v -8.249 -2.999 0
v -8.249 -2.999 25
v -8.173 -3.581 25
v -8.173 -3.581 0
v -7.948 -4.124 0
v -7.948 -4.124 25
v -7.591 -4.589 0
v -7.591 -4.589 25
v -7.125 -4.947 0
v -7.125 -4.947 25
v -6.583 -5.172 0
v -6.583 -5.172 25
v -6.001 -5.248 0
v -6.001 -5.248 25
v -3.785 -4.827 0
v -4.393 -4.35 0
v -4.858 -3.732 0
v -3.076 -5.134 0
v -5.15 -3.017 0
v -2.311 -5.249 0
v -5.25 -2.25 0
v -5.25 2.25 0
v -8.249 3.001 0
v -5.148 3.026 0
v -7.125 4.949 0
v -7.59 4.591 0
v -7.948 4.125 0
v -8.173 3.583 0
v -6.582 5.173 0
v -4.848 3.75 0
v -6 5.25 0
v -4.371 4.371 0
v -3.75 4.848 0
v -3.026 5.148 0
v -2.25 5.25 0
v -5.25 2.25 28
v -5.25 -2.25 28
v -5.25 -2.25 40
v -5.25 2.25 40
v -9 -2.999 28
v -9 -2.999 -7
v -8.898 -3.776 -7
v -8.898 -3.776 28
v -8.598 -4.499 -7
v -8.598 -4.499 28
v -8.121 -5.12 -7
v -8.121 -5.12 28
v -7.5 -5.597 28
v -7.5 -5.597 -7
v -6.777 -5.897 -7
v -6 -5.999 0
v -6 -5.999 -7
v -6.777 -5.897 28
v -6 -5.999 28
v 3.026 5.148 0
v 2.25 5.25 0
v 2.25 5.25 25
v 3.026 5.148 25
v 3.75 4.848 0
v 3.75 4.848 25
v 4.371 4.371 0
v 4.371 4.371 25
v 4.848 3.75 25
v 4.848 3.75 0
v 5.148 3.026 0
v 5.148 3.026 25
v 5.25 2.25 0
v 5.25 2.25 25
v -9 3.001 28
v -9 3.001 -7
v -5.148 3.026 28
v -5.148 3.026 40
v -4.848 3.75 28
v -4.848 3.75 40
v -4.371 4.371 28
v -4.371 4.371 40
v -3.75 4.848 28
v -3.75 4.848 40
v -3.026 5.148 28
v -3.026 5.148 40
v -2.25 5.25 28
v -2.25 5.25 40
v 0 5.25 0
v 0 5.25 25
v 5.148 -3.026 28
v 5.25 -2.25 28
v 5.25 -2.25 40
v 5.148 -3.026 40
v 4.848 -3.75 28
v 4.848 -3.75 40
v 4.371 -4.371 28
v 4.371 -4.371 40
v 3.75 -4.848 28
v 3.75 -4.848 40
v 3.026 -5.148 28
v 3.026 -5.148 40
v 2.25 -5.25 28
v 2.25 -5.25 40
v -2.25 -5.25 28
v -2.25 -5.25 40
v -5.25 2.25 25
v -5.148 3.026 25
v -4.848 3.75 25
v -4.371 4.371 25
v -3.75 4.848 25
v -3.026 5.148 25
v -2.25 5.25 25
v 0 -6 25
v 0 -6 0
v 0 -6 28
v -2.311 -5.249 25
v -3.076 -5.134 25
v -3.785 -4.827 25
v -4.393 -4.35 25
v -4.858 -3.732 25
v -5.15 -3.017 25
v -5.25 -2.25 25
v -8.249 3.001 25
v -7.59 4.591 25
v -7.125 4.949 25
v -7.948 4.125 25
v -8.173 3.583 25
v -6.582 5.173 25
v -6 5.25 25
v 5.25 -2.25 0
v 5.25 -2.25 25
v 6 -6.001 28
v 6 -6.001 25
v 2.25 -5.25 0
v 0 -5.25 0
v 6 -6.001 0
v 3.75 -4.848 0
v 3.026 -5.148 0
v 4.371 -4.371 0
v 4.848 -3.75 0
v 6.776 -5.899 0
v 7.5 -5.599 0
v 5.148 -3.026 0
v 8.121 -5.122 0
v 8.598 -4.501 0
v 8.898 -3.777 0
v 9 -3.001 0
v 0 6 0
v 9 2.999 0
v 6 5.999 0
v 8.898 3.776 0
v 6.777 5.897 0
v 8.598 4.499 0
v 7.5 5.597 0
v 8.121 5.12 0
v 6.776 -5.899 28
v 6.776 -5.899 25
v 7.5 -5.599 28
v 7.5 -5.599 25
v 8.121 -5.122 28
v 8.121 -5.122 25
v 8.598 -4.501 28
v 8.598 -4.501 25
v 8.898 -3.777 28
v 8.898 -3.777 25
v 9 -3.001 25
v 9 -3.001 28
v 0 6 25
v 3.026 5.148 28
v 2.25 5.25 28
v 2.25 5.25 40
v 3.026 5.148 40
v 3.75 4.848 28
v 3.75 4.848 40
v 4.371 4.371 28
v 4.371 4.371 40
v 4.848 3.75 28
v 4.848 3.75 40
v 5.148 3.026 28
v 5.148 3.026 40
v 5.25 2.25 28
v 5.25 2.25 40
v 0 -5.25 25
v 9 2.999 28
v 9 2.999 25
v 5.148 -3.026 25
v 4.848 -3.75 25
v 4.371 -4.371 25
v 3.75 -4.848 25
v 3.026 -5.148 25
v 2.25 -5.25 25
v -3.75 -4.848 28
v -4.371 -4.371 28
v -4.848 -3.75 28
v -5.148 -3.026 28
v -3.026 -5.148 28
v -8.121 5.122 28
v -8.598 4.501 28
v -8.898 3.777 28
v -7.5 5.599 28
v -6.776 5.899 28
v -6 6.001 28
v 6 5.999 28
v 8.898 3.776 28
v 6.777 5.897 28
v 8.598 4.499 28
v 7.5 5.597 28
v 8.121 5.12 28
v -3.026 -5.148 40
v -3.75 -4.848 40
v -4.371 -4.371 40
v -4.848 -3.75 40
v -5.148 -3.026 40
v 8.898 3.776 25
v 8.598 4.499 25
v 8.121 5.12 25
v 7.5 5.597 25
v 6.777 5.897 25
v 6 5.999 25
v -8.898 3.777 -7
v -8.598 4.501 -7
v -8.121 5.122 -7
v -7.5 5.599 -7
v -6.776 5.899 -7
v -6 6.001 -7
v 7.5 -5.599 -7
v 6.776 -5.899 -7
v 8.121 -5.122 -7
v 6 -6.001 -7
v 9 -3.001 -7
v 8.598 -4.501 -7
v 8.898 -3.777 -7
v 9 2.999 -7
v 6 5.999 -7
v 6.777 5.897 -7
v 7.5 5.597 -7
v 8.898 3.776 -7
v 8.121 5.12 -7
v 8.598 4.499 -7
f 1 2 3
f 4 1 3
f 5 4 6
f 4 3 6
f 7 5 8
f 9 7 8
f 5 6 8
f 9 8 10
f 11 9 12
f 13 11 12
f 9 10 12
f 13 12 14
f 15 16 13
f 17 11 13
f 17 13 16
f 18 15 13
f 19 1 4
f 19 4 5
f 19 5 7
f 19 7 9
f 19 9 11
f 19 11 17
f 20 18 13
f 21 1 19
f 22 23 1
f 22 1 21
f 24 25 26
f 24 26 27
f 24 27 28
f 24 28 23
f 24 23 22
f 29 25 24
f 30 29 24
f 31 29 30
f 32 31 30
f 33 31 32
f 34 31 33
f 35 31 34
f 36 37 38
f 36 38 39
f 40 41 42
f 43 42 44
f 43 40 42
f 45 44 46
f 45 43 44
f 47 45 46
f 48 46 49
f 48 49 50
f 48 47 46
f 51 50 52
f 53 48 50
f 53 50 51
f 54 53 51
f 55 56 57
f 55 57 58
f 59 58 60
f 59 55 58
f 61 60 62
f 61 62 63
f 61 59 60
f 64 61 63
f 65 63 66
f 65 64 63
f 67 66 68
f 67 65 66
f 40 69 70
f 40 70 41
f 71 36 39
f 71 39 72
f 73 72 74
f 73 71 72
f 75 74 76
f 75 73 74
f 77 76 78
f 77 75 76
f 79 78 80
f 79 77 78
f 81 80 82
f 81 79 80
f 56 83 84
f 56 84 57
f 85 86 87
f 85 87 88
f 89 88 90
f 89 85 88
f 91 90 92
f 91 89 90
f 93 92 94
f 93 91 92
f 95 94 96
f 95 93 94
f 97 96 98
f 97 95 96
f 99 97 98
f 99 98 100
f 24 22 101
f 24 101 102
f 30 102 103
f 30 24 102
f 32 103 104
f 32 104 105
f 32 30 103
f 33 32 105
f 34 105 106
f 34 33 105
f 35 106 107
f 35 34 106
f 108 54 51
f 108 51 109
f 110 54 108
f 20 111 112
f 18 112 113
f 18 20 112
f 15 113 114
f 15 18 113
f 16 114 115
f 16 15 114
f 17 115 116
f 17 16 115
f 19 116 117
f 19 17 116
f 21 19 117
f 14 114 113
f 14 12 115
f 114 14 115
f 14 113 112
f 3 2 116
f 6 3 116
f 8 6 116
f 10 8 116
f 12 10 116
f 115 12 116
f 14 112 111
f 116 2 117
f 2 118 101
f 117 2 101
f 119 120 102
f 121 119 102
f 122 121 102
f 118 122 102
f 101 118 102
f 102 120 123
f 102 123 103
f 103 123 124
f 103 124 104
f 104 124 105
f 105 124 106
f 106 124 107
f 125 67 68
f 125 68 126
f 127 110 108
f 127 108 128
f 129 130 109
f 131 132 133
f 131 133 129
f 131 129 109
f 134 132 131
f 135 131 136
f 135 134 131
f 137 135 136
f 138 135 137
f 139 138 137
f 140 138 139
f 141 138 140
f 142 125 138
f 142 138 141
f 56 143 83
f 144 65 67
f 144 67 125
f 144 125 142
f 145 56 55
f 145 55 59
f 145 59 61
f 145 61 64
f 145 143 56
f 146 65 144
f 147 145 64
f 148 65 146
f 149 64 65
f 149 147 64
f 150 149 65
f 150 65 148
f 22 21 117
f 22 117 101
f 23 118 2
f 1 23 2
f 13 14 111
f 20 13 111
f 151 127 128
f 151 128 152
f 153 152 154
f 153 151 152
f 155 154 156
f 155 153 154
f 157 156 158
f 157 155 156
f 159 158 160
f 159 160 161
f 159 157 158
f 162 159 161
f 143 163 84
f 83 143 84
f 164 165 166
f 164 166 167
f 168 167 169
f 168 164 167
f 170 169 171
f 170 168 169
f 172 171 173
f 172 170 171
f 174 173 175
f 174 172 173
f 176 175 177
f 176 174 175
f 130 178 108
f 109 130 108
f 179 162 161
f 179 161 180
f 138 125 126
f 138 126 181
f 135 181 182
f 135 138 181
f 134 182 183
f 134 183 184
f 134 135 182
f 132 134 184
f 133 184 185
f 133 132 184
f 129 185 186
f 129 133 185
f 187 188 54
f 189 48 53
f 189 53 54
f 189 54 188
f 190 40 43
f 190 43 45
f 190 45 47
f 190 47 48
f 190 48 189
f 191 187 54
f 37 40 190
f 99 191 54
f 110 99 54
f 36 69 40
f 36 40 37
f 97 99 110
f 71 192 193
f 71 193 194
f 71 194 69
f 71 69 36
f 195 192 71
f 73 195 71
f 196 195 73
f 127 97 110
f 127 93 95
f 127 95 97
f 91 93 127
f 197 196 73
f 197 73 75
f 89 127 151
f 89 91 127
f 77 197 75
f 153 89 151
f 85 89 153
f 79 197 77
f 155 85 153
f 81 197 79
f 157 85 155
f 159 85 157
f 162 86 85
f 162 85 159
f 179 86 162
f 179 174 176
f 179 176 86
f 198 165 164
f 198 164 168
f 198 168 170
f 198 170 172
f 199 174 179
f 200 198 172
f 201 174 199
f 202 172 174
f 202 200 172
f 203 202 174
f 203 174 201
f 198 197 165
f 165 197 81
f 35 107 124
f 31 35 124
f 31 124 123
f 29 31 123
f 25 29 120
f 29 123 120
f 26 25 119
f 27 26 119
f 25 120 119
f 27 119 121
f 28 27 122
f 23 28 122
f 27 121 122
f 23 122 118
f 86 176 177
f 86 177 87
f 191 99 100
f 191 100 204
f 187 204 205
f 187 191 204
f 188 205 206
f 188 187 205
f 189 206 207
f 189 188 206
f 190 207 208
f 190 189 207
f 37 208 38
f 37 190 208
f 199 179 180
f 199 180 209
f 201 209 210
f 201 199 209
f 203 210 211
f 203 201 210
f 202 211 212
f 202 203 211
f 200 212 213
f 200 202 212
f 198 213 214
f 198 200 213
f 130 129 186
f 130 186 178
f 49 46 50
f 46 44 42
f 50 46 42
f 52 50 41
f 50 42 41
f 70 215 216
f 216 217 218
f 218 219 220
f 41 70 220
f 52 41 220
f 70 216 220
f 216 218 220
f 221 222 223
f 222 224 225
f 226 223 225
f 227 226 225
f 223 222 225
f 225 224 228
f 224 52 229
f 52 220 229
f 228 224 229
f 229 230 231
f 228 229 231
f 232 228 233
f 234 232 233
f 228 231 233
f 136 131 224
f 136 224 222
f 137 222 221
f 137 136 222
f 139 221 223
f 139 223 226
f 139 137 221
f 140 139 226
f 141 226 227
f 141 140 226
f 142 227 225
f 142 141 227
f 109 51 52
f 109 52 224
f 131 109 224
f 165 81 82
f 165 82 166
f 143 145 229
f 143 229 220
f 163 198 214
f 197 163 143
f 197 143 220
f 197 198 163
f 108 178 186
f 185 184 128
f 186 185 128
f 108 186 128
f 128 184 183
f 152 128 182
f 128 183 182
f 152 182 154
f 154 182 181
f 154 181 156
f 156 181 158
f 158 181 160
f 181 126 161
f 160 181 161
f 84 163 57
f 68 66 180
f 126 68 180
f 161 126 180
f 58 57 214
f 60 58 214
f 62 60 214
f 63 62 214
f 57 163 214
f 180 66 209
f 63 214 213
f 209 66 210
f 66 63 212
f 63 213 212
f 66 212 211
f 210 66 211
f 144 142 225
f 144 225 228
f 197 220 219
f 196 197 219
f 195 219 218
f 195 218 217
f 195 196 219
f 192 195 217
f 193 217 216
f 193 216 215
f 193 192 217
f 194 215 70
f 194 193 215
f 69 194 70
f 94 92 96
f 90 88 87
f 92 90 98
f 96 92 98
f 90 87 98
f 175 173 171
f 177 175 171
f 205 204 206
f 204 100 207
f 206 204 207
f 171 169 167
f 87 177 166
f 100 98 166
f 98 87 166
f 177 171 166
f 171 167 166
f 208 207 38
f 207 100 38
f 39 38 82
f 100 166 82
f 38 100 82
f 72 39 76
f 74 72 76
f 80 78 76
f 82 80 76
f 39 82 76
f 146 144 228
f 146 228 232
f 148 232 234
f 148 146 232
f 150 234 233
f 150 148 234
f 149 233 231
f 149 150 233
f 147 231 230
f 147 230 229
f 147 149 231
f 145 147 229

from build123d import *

# Parameters (mm, degrees)
BOSS_EXTRUDE1_DEPTH = 40
BOSS_EXTRUDE2_DEPTH = 7
BOSS_EXTRUDE3_START = 25
BOSS_EXTRUDE3_DEPTH = 25
BOSS_EXTRUDE4_START = -12
BOSS_EXTRUDE4_DEPTH = 3


with BuildPart() as part:
    # Sketch1 → Boss-Extrude1 (new body)
    with BuildSketch(Plane.XY):
        with BuildLine():
            Line((-2.25, 5.25), (2.25, 5.25))
            ThreePointArc((2.25, 5.25), (4.371320344, 4.371320344), (5.25, 2.25))
            Line((5.25, 2.25), (5.25, -2.25))
            ThreePointArc((5.25, -2.25), (4.371320344, -4.371320344), (2.25, -5.25))
            Line((2.25, -5.25), (-2.25, -5.25))
            ThreePointArc((-2.25, -5.25), (-4.371320344, -4.371320344), (-5.25, -2.25))
            Line((-5.25, -2.25), (-5.25, 2.25))
            ThreePointArc((-5.25, 2.25), (-4.371320344, 4.371320344), (-2.25, 5.25))
        make_face()
    extrude(amount=BOSS_EXTRUDE1_DEPTH)

    # Sketch2 → Boss-Extrude2 (add)
    with BuildSketch(Plane.XY):
        with BuildLine():
            Line((8.999999945, -3.000810302), (8.999999945, 2.999189698))
            ThreePointArc((8.999999945, 2.999189698), (8.121463527, 5.120366794), (6.000405096, 5.999189671))
            Line((6.000405096, 5.999189671), (-5.999594794, 6.000810275))
            ThreePointArc((-5.999594794, 6.000810275), (-8.121177041, 5.122273883), (-8.999999945, 3.000810302))
            Line((-8.999999945, 3.000810302), (-8.999999945, -2.999189698))
            ThreePointArc((-8.999999945, -2.999189698), (-8.121463527, -5.120366794), (-6.000405096, -5.999189671))
            Line((-6.000405096, -5.999189671), (5.999594794, -6.000810275))
            ThreePointArc((5.999594794, -6.000810275), (8.121177041, -5.122273883), (8.999999945, -3.000810302))
        make_face()
    extrude(amount=-BOSS_EXTRUDE2_DEPTH)

    # Sketch3 → Boss-Extrude3 (add)
    with BuildSketch(Plane.XY.offset(BOSS_EXTRUDE3_START)):
        with BuildLine():
            Line((0.000405151, 5.25), (-5.999999945, 5.25))
            ThreePointArc((-5.999999945, 5.25), (-7.590417233, 4.59122759), (-8.249189643, 3.000810302))
            Line((-8.249189643, 3.000810302), (-8.249189643, -2.999189698))
            ThreePointArc((-8.249189643, -2.999189698), (-7.590631979, -4.58939221), (-6.000607381, -5.248379314))
            Line((-6.000607381, -5.248379314), (0.000405151, -5.25))
            Line((0.000405151, -5.25), (0.000405151, -6.000000082))
            Line((0.000405151, -6.000000082), (-6.000405096, -5.999189671))
            ThreePointArc((-6.000405096, -5.999189671), (-8.121463527, -5.120366794), (-8.999999945, -2.999189698))
            Line((-8.999999945, -2.999189698), (-8.999999945, 3.000810302))
            ThreePointArc((-8.999999945, 3.000810302), (-8.121177041, 5.122273883), (-5.999594794, 6.000810275))
            Line((-5.999594794, 6.000810275), (0.000405151, 5.999999973))
            Line((0.000405151, 5.999999973), (0.000405151, 5.25))
        make_face()
    extrude(amount=-BOSS_EXTRUDE3_DEPTH)

    # Sketch5 → Boss-Extrude4 (add)
    with BuildSketch(Plane.XY.offset(40).offset(BOSS_EXTRUDE4_START)):
        with BuildLine():
            Line((0.000405151, -6.000000082), (5.999594794, -6.000810275))
            ThreePointArc((5.999594794, -6.000810275), (8.121177041, -5.122273883), (8.999999945, -3.000810302))
            Line((8.999999945, -3.000810302), (8.999999945, 2.999189698))
            ThreePointArc((8.999999945, 2.999189698), (8.121463527, 5.120366794), (6.000405096, 5.999189671))
            Line((6.000405096, 5.999189671), (0.000405151, 5.999999973))
            Line((0.000405151, 5.999999973), (-5.999594794, 6.000810275))
            ThreePointArc((-5.999594794, 6.000810275), (-8.121177041, 5.122273883), (-8.999999945, 3.000810302))
            Line((-8.999999945, 3.000810302), (-8.999999945, -2.999189698))
            ThreePointArc((-8.999999945, -2.999189698), (-8.121463527, -5.120366794), (-6.000405096, -5.999189671))
            Line((-6.000405096, -5.999189671), (0.000405151, -6.000000082))
        make_face()
    extrude(amount=-BOSS_EXTRUDE4_DEPTH)


solid = part.part
